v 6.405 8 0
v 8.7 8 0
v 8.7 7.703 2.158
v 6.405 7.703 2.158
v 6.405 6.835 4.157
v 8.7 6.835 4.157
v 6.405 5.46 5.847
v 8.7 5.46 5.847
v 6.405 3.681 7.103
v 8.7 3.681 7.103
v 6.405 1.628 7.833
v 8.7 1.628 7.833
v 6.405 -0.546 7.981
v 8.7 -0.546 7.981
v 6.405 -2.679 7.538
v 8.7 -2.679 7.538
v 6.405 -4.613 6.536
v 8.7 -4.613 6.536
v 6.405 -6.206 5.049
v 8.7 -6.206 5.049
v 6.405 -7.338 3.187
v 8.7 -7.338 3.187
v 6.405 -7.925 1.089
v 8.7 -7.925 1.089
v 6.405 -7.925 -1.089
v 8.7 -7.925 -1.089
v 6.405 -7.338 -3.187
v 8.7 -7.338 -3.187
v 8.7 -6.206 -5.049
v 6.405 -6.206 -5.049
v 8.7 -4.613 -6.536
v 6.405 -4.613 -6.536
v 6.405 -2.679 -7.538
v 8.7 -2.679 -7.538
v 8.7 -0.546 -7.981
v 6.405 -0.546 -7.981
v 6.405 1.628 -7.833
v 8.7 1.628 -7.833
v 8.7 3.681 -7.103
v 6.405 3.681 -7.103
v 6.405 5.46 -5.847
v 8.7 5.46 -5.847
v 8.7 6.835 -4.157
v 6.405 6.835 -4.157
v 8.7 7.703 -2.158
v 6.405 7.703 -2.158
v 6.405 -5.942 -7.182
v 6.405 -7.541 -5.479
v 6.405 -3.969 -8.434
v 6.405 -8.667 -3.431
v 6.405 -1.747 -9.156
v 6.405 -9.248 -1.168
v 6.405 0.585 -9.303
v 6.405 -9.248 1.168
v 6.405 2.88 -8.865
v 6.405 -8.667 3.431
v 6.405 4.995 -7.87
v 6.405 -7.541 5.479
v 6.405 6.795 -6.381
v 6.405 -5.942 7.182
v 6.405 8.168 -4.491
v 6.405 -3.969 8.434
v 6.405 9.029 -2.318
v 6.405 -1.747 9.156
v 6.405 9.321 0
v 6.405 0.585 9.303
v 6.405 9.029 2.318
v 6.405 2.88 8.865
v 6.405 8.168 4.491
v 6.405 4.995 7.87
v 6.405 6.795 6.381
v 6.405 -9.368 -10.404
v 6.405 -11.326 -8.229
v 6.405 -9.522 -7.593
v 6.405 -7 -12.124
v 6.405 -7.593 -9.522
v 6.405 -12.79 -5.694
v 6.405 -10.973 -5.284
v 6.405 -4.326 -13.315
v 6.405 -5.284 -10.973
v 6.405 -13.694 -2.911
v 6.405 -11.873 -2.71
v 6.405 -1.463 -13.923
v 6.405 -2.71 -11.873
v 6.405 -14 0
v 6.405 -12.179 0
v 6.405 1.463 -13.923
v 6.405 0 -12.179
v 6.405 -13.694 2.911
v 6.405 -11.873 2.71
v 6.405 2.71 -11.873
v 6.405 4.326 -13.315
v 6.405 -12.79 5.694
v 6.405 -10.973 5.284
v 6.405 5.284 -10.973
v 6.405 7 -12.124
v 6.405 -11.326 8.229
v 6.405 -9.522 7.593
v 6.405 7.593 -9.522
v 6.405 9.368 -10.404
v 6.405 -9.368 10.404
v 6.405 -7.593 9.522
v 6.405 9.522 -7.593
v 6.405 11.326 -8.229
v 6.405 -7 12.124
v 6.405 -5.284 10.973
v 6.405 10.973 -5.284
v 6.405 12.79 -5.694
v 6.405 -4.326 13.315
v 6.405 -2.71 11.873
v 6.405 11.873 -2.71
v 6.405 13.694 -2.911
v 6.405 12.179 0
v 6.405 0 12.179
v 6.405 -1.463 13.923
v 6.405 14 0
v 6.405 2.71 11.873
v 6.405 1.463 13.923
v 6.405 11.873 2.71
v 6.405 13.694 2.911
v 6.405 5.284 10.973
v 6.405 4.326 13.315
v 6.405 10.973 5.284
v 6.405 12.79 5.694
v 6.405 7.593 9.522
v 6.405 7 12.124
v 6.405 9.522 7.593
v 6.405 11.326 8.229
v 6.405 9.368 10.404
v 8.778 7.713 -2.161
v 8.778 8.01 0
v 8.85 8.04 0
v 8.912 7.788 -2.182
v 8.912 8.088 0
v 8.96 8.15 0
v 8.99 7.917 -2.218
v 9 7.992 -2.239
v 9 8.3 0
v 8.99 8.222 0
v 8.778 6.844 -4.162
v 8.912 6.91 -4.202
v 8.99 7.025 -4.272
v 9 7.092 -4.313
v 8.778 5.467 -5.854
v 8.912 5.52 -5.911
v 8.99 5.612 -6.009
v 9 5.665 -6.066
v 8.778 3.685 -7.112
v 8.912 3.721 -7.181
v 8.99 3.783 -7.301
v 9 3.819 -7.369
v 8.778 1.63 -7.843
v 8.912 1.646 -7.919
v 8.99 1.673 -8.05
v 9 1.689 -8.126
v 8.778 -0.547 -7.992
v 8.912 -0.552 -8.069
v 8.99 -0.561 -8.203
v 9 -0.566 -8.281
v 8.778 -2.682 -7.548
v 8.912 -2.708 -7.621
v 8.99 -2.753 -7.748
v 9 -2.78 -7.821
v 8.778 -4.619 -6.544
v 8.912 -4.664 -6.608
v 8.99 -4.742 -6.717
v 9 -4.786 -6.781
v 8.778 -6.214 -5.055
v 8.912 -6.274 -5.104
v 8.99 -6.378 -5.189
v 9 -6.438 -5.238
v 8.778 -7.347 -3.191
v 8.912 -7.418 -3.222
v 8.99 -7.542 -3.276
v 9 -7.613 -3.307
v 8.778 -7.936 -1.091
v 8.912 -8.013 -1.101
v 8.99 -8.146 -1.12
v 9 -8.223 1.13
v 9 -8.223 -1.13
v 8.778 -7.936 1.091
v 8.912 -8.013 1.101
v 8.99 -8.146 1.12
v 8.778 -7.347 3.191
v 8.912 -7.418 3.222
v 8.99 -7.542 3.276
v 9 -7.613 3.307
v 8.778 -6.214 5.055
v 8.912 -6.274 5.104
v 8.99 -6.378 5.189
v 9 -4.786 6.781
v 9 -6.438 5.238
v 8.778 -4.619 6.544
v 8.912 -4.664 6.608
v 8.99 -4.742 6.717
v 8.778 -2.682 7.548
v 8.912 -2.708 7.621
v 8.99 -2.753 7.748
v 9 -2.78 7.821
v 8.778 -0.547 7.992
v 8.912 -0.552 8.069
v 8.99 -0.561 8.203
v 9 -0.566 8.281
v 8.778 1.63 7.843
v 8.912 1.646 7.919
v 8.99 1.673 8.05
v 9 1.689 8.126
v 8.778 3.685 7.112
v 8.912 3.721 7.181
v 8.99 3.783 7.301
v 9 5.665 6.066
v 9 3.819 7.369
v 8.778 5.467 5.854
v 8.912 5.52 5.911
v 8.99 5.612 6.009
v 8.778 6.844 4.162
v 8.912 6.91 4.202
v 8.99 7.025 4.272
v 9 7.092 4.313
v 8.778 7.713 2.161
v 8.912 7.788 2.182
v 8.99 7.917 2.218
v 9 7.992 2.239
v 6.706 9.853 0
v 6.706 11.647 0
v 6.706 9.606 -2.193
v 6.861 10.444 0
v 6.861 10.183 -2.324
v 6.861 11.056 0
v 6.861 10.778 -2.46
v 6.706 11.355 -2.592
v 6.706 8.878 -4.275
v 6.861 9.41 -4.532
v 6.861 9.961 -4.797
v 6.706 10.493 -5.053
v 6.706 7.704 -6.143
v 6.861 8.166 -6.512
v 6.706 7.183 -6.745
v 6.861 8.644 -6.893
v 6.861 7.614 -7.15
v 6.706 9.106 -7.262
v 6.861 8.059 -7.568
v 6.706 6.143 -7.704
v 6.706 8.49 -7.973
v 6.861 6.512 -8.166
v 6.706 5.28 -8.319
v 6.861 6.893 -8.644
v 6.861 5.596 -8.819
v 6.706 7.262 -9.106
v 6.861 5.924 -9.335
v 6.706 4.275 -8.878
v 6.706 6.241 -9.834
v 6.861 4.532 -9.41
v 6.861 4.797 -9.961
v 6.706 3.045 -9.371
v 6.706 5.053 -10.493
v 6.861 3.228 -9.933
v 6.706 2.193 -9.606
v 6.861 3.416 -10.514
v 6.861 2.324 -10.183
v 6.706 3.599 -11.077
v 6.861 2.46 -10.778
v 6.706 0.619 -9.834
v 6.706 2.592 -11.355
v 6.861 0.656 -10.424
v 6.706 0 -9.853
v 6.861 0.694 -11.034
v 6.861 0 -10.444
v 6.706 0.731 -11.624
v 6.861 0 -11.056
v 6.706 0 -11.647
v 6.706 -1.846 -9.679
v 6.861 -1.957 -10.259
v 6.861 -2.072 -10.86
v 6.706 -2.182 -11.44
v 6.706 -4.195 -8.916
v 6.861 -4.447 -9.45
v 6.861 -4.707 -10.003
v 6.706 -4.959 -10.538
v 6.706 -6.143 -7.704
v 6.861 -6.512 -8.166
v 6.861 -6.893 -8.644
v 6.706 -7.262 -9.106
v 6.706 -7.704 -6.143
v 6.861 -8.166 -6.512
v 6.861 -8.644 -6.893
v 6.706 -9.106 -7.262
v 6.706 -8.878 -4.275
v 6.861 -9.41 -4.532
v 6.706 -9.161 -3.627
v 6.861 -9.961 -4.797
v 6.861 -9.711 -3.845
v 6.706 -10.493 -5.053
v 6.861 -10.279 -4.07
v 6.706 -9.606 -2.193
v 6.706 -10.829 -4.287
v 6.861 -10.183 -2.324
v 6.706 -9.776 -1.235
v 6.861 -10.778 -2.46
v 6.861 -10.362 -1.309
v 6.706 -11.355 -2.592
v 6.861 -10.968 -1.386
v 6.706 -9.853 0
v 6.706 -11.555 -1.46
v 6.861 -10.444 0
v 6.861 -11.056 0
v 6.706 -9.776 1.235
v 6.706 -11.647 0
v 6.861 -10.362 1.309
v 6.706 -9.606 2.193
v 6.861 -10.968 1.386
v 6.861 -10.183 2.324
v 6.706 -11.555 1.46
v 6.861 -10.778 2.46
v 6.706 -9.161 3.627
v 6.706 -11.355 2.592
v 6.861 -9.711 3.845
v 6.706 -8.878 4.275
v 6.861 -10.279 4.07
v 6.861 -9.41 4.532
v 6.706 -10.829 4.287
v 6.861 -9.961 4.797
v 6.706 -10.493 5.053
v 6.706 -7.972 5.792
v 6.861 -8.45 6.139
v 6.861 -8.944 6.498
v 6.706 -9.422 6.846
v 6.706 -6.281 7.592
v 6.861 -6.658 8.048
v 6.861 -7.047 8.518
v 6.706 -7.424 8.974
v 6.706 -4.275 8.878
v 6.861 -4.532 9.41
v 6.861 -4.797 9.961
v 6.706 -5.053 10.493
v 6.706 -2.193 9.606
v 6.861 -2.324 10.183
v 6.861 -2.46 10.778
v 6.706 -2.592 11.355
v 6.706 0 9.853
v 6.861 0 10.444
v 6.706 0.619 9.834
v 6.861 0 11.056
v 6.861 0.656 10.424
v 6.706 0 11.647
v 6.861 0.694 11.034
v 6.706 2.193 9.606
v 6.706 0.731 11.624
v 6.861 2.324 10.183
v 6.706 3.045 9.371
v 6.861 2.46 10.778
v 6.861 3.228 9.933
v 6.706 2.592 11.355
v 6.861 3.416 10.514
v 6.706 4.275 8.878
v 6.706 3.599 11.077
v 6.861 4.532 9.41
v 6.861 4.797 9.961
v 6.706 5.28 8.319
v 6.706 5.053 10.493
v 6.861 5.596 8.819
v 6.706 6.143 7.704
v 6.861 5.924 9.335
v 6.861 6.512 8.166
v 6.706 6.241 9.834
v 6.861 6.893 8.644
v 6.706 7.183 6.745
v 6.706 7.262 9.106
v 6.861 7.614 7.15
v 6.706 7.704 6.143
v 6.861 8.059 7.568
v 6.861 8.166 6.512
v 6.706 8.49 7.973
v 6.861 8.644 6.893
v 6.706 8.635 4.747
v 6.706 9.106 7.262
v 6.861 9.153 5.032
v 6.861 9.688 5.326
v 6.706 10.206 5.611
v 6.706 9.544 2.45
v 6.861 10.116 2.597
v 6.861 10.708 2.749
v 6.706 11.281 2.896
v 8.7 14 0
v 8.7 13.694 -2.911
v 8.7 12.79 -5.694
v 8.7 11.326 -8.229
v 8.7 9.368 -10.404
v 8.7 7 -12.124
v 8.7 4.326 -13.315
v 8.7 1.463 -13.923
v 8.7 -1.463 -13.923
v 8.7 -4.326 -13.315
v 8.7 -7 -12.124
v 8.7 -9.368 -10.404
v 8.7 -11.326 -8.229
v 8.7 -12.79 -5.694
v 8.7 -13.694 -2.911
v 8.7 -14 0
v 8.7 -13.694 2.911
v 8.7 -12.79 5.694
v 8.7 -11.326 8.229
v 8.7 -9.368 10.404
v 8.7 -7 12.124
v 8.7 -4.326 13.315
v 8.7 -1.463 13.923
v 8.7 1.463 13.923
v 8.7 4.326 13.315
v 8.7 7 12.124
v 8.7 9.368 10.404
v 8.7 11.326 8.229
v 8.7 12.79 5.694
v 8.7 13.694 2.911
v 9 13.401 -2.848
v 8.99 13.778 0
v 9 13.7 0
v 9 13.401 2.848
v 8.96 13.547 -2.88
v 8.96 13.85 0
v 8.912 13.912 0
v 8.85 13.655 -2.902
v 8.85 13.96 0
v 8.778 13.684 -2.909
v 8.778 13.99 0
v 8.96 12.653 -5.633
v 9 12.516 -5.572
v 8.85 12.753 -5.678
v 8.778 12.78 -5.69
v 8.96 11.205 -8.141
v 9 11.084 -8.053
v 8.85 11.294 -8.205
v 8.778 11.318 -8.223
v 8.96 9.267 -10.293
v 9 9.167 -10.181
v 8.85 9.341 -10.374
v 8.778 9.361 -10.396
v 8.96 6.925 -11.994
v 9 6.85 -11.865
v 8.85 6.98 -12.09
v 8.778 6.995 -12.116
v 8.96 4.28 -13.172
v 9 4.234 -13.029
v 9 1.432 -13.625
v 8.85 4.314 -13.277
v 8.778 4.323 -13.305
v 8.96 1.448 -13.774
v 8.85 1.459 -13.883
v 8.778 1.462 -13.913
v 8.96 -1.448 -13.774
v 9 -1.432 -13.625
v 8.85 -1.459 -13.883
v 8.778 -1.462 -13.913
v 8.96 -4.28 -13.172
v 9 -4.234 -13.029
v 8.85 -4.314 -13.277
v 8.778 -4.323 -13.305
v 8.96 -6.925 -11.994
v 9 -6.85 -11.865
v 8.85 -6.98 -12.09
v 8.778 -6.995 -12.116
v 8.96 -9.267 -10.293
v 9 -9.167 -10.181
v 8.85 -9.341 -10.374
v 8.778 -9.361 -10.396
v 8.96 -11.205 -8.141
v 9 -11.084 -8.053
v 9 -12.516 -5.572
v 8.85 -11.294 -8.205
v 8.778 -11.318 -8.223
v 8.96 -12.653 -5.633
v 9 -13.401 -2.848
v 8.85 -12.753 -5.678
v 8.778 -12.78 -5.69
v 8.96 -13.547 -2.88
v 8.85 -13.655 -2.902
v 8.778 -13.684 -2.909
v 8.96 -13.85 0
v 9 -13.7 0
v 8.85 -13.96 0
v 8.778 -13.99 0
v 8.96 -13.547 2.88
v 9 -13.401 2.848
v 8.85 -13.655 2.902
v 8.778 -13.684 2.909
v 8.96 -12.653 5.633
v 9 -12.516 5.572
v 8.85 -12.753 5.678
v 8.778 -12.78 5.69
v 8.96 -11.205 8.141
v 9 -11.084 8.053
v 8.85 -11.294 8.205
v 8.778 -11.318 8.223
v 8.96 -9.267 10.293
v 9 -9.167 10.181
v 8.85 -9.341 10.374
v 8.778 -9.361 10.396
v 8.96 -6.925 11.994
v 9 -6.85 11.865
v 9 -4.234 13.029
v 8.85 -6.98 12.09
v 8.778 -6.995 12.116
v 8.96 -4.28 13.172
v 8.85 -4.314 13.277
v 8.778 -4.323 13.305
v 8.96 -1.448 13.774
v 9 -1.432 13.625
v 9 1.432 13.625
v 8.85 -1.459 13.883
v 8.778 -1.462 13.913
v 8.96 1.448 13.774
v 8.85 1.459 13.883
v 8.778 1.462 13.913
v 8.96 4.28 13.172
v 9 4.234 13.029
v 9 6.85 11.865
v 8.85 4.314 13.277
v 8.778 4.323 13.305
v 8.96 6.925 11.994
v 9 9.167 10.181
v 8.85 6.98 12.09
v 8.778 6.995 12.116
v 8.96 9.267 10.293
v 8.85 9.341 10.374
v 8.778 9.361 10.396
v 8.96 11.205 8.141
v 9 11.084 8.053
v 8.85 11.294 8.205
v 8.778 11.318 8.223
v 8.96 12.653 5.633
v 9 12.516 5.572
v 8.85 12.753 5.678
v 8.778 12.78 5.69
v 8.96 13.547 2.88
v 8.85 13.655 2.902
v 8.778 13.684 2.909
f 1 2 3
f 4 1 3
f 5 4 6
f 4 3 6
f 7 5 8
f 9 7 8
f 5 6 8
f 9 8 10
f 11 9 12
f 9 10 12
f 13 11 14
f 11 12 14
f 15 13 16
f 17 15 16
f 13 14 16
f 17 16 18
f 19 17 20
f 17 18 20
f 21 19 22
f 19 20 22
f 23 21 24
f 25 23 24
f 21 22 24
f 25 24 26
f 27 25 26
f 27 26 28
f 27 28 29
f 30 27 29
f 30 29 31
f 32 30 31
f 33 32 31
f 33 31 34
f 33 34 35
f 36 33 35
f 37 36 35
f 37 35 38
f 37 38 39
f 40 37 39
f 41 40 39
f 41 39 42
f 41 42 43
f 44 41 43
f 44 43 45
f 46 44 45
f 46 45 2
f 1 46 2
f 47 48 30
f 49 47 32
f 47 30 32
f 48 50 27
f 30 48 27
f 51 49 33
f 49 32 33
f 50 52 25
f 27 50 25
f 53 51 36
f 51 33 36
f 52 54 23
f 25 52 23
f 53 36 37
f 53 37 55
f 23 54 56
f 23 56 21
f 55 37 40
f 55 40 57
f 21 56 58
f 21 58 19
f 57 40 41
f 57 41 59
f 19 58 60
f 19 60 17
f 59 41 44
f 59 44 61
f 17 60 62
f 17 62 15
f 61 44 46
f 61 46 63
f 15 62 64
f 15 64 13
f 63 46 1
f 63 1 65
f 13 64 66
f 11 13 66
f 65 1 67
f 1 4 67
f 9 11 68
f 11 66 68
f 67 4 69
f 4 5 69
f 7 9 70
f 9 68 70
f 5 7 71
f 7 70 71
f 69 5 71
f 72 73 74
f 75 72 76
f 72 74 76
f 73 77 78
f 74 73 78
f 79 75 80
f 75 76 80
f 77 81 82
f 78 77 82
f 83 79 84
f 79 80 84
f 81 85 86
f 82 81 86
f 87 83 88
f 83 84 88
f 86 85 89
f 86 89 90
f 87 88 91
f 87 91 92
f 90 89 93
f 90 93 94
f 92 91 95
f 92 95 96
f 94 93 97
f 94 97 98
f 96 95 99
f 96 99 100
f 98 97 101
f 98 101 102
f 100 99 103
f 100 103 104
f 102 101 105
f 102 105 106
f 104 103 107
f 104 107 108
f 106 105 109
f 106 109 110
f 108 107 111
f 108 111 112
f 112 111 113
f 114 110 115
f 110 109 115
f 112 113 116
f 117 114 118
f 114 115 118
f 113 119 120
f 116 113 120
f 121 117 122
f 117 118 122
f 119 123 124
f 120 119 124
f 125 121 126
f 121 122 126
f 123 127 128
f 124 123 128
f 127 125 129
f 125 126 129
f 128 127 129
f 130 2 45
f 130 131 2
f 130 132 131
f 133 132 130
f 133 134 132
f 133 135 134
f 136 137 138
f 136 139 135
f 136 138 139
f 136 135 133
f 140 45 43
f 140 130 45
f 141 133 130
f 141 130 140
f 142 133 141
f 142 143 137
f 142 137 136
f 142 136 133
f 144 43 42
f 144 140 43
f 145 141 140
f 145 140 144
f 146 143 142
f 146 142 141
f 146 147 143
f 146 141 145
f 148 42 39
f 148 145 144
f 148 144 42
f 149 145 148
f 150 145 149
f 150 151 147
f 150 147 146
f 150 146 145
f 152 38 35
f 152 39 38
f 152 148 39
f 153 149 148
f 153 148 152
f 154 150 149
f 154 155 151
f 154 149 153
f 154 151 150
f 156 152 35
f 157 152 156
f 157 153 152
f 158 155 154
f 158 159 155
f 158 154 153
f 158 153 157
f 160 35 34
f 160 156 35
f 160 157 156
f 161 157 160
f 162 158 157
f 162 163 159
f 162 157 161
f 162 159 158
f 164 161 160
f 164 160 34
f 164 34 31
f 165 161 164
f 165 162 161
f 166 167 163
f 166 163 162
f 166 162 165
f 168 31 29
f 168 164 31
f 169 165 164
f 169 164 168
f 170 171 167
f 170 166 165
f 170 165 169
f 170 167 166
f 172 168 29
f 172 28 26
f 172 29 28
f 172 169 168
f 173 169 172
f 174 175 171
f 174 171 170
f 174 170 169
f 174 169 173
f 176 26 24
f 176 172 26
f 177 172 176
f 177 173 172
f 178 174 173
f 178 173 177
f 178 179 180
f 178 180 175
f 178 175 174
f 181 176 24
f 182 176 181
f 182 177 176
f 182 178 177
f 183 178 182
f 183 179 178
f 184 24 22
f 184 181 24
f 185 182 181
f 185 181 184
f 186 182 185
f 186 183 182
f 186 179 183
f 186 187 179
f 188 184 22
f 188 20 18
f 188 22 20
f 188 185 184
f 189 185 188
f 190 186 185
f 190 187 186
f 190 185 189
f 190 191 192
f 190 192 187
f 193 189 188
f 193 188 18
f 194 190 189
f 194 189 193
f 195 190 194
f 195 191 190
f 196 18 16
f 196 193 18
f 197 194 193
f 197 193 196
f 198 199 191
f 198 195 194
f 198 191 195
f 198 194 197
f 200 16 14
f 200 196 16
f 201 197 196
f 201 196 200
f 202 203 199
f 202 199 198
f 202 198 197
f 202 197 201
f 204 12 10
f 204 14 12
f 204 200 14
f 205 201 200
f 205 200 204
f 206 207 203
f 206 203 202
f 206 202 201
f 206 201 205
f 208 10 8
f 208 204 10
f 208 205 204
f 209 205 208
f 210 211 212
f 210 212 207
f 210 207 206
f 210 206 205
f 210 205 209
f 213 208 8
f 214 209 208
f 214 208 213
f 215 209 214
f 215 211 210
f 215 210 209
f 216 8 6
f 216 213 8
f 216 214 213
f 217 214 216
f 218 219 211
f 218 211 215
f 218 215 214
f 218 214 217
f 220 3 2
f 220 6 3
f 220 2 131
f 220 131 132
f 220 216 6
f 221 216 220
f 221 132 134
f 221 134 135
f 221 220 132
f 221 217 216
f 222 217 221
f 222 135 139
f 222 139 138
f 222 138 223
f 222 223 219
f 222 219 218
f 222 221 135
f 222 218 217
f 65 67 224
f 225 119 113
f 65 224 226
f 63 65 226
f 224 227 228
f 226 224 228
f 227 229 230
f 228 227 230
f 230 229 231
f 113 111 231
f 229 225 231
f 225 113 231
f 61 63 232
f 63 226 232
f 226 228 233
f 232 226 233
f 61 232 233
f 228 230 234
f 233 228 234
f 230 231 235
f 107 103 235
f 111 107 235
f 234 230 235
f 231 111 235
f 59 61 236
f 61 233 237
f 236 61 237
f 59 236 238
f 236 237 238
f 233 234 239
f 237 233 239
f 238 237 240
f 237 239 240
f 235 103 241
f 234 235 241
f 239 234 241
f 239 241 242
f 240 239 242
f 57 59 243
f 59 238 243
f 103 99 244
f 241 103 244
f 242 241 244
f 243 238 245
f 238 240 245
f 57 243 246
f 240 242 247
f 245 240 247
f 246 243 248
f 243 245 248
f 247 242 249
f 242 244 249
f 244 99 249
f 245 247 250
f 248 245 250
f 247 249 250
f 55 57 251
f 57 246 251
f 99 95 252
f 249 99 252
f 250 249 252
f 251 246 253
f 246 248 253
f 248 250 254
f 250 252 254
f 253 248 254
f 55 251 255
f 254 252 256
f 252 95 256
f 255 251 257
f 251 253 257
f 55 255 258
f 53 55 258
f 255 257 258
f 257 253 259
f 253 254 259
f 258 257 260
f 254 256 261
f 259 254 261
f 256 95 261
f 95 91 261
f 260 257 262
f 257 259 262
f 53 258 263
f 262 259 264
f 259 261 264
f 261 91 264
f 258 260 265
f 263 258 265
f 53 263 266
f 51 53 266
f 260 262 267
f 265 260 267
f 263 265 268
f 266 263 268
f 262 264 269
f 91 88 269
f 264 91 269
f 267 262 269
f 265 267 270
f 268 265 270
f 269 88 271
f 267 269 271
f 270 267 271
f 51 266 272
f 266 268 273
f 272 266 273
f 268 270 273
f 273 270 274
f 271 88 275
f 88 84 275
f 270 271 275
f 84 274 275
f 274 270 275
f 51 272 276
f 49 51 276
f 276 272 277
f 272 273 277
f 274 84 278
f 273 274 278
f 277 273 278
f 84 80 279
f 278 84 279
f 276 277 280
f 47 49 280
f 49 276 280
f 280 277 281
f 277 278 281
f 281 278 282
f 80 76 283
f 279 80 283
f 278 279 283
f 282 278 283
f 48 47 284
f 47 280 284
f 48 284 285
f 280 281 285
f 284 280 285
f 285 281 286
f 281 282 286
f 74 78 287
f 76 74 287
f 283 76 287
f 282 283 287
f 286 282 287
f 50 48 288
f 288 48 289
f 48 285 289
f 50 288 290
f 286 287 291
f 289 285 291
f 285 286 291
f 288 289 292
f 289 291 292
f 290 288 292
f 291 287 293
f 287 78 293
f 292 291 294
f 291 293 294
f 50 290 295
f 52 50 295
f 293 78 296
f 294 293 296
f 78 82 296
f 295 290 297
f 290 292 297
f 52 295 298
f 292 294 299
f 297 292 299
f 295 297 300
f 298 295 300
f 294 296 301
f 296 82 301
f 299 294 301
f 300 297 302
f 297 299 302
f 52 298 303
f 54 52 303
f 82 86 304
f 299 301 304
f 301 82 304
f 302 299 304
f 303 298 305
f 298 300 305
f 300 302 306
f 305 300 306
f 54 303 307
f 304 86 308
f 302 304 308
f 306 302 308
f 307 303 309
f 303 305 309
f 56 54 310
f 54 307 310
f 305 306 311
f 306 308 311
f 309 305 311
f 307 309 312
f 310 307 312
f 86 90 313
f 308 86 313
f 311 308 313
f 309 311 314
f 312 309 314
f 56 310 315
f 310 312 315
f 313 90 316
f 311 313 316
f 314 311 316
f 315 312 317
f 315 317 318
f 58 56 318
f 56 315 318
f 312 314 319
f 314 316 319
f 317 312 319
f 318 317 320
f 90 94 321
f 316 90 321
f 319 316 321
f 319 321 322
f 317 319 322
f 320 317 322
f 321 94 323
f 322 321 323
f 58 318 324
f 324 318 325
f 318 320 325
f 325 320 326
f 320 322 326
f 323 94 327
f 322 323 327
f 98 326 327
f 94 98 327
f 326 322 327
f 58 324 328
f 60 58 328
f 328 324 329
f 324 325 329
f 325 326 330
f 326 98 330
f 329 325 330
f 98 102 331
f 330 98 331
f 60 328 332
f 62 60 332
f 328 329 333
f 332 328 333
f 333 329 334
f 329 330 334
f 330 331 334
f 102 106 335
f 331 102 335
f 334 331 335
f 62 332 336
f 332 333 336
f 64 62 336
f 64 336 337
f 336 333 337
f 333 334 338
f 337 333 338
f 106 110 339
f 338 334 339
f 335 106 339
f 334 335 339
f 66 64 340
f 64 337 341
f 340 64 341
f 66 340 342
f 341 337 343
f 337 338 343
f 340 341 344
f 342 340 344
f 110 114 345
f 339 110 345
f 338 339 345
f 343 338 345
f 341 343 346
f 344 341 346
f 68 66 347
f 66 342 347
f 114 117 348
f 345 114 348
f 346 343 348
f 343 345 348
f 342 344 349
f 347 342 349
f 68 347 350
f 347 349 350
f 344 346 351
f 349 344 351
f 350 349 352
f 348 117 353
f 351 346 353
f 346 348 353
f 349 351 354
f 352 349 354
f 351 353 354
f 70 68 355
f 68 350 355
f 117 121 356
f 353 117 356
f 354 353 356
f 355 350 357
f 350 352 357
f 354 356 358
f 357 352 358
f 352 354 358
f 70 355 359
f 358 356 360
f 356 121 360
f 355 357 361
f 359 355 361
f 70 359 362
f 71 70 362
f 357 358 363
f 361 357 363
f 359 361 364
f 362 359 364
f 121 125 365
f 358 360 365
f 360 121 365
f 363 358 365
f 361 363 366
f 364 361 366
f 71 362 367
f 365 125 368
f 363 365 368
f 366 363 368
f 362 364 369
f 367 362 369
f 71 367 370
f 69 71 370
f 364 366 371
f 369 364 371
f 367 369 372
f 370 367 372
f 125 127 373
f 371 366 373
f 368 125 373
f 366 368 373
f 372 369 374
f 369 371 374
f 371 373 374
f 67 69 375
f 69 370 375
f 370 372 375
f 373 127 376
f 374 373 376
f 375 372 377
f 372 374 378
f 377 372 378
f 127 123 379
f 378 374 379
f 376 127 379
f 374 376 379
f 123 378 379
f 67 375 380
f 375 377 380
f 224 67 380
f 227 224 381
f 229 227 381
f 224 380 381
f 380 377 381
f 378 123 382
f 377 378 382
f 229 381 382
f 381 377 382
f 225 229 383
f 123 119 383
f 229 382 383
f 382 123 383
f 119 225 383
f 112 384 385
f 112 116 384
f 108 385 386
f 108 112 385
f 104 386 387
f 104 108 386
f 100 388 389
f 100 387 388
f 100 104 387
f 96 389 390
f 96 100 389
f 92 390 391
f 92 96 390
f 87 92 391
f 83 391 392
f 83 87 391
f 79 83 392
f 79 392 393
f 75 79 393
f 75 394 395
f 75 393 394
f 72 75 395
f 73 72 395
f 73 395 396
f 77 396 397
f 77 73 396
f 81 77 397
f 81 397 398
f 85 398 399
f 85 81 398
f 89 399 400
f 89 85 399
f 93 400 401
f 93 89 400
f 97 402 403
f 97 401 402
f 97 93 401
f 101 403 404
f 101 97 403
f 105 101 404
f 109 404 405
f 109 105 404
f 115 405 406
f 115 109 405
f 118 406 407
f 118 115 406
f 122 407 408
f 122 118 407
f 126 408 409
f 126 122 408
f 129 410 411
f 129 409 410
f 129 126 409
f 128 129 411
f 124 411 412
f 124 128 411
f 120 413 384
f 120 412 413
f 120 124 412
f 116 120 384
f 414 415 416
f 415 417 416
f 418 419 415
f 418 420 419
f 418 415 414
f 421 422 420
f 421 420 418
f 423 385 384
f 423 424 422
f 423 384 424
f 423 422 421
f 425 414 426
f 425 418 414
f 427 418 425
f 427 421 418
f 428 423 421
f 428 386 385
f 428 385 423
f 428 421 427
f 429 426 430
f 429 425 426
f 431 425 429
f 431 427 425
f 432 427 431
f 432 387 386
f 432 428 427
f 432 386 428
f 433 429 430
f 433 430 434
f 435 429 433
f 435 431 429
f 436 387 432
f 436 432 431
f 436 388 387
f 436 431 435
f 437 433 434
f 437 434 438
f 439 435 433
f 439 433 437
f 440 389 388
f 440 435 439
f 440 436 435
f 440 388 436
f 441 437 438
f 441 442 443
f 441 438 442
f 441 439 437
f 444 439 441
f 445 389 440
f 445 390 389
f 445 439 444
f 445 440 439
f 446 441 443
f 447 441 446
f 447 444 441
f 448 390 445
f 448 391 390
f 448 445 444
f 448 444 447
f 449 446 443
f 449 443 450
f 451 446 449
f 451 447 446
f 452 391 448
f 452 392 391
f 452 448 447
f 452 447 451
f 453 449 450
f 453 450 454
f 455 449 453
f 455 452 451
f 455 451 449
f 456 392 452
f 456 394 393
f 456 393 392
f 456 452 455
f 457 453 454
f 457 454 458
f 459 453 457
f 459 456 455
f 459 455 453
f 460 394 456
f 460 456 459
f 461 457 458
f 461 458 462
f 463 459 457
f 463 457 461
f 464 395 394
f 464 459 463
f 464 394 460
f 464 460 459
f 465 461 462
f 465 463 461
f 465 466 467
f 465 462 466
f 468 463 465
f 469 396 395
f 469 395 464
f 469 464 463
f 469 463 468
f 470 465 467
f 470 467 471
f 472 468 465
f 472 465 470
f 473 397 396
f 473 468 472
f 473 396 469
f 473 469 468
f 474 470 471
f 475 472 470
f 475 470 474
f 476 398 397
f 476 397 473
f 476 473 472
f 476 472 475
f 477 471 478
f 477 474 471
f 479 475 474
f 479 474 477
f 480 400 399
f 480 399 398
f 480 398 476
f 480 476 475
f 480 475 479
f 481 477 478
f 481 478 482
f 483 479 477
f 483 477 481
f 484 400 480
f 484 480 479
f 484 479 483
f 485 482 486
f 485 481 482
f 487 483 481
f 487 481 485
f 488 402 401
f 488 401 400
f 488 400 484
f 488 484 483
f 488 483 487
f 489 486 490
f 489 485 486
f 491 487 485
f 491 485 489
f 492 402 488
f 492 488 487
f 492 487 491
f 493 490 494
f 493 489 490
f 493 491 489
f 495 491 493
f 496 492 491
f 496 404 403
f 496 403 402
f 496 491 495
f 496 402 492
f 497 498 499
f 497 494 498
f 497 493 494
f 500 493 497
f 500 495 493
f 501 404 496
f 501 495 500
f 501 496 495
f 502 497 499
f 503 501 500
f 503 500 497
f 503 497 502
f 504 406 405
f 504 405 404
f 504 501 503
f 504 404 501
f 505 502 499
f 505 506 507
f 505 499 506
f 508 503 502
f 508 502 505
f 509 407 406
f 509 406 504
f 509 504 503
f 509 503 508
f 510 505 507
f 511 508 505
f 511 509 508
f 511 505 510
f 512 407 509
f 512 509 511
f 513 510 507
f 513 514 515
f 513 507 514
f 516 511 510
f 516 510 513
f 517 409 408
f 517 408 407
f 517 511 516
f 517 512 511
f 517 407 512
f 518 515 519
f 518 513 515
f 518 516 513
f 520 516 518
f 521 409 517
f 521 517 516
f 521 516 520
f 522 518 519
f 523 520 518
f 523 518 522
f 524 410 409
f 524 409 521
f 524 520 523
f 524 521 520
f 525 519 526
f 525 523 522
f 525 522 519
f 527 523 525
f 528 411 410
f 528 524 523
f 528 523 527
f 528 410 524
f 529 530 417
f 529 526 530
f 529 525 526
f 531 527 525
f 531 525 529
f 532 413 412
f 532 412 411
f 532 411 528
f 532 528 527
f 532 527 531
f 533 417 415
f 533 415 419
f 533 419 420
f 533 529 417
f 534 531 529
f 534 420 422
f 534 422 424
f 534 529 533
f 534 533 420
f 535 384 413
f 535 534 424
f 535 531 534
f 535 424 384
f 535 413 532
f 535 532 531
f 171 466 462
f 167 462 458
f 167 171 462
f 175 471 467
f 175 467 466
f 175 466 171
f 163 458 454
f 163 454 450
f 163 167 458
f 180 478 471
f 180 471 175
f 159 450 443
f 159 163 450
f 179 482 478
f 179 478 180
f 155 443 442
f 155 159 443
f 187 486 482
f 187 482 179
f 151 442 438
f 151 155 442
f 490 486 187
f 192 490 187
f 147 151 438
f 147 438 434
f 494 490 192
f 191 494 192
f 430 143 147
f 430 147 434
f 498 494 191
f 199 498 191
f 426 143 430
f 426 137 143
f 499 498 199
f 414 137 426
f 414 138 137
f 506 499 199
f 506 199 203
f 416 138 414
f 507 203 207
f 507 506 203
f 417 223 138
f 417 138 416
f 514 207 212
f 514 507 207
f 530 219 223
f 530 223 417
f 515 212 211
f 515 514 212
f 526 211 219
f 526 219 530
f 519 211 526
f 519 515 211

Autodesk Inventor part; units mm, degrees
ref_plane "YZ Plane" through (0, 0, 0) normal (1, 0, 0) x (0, 1, 0)
ref_plane "XZ Plane" through (0, 0, 0) normal (0, 1, 0) x (-1, 0, 0)
ref_plane "XY Plane" through (0, 0, 0) normal (0, 0, 1) x (1, 0, 0)
sketch "Sketch_1" plane through (0, 0, 0) normal (0, 0, 1) x (1, 0, 0)
  line L0 (8.7, 0) -> (6.4048, 0)
  line L1 (6.4048, 9.3214) -> (6.4048, 8)
  line L2 (6.4048, 8) -> (8.7, 8)
  arc A0 (8.7, 8) -> (9, 8.3) centre (8.7, 8.3) ccw
  line L3 (9, 8.3) -> (9, 13.7)
  arc A1 (9, 13.7) -> (8.7, 14) centre (8.7, 13.7) ccw
  line L4 (8.7, 14) -> (6.4048, 14)
  line L5 (6.4048, 14) -> (6.4048, 12.1786)
  arc A2 (6.4048, 9.3214) -> (6.4048, 12.1786) centre (4.5, 10.75) ccw
revolve "Revolution1" add sketch "Sketch_1" angle 360 about axis through (8.7, 0, 0) along (1, 0, 0)
properties part number "SKF_51102_PART3"
